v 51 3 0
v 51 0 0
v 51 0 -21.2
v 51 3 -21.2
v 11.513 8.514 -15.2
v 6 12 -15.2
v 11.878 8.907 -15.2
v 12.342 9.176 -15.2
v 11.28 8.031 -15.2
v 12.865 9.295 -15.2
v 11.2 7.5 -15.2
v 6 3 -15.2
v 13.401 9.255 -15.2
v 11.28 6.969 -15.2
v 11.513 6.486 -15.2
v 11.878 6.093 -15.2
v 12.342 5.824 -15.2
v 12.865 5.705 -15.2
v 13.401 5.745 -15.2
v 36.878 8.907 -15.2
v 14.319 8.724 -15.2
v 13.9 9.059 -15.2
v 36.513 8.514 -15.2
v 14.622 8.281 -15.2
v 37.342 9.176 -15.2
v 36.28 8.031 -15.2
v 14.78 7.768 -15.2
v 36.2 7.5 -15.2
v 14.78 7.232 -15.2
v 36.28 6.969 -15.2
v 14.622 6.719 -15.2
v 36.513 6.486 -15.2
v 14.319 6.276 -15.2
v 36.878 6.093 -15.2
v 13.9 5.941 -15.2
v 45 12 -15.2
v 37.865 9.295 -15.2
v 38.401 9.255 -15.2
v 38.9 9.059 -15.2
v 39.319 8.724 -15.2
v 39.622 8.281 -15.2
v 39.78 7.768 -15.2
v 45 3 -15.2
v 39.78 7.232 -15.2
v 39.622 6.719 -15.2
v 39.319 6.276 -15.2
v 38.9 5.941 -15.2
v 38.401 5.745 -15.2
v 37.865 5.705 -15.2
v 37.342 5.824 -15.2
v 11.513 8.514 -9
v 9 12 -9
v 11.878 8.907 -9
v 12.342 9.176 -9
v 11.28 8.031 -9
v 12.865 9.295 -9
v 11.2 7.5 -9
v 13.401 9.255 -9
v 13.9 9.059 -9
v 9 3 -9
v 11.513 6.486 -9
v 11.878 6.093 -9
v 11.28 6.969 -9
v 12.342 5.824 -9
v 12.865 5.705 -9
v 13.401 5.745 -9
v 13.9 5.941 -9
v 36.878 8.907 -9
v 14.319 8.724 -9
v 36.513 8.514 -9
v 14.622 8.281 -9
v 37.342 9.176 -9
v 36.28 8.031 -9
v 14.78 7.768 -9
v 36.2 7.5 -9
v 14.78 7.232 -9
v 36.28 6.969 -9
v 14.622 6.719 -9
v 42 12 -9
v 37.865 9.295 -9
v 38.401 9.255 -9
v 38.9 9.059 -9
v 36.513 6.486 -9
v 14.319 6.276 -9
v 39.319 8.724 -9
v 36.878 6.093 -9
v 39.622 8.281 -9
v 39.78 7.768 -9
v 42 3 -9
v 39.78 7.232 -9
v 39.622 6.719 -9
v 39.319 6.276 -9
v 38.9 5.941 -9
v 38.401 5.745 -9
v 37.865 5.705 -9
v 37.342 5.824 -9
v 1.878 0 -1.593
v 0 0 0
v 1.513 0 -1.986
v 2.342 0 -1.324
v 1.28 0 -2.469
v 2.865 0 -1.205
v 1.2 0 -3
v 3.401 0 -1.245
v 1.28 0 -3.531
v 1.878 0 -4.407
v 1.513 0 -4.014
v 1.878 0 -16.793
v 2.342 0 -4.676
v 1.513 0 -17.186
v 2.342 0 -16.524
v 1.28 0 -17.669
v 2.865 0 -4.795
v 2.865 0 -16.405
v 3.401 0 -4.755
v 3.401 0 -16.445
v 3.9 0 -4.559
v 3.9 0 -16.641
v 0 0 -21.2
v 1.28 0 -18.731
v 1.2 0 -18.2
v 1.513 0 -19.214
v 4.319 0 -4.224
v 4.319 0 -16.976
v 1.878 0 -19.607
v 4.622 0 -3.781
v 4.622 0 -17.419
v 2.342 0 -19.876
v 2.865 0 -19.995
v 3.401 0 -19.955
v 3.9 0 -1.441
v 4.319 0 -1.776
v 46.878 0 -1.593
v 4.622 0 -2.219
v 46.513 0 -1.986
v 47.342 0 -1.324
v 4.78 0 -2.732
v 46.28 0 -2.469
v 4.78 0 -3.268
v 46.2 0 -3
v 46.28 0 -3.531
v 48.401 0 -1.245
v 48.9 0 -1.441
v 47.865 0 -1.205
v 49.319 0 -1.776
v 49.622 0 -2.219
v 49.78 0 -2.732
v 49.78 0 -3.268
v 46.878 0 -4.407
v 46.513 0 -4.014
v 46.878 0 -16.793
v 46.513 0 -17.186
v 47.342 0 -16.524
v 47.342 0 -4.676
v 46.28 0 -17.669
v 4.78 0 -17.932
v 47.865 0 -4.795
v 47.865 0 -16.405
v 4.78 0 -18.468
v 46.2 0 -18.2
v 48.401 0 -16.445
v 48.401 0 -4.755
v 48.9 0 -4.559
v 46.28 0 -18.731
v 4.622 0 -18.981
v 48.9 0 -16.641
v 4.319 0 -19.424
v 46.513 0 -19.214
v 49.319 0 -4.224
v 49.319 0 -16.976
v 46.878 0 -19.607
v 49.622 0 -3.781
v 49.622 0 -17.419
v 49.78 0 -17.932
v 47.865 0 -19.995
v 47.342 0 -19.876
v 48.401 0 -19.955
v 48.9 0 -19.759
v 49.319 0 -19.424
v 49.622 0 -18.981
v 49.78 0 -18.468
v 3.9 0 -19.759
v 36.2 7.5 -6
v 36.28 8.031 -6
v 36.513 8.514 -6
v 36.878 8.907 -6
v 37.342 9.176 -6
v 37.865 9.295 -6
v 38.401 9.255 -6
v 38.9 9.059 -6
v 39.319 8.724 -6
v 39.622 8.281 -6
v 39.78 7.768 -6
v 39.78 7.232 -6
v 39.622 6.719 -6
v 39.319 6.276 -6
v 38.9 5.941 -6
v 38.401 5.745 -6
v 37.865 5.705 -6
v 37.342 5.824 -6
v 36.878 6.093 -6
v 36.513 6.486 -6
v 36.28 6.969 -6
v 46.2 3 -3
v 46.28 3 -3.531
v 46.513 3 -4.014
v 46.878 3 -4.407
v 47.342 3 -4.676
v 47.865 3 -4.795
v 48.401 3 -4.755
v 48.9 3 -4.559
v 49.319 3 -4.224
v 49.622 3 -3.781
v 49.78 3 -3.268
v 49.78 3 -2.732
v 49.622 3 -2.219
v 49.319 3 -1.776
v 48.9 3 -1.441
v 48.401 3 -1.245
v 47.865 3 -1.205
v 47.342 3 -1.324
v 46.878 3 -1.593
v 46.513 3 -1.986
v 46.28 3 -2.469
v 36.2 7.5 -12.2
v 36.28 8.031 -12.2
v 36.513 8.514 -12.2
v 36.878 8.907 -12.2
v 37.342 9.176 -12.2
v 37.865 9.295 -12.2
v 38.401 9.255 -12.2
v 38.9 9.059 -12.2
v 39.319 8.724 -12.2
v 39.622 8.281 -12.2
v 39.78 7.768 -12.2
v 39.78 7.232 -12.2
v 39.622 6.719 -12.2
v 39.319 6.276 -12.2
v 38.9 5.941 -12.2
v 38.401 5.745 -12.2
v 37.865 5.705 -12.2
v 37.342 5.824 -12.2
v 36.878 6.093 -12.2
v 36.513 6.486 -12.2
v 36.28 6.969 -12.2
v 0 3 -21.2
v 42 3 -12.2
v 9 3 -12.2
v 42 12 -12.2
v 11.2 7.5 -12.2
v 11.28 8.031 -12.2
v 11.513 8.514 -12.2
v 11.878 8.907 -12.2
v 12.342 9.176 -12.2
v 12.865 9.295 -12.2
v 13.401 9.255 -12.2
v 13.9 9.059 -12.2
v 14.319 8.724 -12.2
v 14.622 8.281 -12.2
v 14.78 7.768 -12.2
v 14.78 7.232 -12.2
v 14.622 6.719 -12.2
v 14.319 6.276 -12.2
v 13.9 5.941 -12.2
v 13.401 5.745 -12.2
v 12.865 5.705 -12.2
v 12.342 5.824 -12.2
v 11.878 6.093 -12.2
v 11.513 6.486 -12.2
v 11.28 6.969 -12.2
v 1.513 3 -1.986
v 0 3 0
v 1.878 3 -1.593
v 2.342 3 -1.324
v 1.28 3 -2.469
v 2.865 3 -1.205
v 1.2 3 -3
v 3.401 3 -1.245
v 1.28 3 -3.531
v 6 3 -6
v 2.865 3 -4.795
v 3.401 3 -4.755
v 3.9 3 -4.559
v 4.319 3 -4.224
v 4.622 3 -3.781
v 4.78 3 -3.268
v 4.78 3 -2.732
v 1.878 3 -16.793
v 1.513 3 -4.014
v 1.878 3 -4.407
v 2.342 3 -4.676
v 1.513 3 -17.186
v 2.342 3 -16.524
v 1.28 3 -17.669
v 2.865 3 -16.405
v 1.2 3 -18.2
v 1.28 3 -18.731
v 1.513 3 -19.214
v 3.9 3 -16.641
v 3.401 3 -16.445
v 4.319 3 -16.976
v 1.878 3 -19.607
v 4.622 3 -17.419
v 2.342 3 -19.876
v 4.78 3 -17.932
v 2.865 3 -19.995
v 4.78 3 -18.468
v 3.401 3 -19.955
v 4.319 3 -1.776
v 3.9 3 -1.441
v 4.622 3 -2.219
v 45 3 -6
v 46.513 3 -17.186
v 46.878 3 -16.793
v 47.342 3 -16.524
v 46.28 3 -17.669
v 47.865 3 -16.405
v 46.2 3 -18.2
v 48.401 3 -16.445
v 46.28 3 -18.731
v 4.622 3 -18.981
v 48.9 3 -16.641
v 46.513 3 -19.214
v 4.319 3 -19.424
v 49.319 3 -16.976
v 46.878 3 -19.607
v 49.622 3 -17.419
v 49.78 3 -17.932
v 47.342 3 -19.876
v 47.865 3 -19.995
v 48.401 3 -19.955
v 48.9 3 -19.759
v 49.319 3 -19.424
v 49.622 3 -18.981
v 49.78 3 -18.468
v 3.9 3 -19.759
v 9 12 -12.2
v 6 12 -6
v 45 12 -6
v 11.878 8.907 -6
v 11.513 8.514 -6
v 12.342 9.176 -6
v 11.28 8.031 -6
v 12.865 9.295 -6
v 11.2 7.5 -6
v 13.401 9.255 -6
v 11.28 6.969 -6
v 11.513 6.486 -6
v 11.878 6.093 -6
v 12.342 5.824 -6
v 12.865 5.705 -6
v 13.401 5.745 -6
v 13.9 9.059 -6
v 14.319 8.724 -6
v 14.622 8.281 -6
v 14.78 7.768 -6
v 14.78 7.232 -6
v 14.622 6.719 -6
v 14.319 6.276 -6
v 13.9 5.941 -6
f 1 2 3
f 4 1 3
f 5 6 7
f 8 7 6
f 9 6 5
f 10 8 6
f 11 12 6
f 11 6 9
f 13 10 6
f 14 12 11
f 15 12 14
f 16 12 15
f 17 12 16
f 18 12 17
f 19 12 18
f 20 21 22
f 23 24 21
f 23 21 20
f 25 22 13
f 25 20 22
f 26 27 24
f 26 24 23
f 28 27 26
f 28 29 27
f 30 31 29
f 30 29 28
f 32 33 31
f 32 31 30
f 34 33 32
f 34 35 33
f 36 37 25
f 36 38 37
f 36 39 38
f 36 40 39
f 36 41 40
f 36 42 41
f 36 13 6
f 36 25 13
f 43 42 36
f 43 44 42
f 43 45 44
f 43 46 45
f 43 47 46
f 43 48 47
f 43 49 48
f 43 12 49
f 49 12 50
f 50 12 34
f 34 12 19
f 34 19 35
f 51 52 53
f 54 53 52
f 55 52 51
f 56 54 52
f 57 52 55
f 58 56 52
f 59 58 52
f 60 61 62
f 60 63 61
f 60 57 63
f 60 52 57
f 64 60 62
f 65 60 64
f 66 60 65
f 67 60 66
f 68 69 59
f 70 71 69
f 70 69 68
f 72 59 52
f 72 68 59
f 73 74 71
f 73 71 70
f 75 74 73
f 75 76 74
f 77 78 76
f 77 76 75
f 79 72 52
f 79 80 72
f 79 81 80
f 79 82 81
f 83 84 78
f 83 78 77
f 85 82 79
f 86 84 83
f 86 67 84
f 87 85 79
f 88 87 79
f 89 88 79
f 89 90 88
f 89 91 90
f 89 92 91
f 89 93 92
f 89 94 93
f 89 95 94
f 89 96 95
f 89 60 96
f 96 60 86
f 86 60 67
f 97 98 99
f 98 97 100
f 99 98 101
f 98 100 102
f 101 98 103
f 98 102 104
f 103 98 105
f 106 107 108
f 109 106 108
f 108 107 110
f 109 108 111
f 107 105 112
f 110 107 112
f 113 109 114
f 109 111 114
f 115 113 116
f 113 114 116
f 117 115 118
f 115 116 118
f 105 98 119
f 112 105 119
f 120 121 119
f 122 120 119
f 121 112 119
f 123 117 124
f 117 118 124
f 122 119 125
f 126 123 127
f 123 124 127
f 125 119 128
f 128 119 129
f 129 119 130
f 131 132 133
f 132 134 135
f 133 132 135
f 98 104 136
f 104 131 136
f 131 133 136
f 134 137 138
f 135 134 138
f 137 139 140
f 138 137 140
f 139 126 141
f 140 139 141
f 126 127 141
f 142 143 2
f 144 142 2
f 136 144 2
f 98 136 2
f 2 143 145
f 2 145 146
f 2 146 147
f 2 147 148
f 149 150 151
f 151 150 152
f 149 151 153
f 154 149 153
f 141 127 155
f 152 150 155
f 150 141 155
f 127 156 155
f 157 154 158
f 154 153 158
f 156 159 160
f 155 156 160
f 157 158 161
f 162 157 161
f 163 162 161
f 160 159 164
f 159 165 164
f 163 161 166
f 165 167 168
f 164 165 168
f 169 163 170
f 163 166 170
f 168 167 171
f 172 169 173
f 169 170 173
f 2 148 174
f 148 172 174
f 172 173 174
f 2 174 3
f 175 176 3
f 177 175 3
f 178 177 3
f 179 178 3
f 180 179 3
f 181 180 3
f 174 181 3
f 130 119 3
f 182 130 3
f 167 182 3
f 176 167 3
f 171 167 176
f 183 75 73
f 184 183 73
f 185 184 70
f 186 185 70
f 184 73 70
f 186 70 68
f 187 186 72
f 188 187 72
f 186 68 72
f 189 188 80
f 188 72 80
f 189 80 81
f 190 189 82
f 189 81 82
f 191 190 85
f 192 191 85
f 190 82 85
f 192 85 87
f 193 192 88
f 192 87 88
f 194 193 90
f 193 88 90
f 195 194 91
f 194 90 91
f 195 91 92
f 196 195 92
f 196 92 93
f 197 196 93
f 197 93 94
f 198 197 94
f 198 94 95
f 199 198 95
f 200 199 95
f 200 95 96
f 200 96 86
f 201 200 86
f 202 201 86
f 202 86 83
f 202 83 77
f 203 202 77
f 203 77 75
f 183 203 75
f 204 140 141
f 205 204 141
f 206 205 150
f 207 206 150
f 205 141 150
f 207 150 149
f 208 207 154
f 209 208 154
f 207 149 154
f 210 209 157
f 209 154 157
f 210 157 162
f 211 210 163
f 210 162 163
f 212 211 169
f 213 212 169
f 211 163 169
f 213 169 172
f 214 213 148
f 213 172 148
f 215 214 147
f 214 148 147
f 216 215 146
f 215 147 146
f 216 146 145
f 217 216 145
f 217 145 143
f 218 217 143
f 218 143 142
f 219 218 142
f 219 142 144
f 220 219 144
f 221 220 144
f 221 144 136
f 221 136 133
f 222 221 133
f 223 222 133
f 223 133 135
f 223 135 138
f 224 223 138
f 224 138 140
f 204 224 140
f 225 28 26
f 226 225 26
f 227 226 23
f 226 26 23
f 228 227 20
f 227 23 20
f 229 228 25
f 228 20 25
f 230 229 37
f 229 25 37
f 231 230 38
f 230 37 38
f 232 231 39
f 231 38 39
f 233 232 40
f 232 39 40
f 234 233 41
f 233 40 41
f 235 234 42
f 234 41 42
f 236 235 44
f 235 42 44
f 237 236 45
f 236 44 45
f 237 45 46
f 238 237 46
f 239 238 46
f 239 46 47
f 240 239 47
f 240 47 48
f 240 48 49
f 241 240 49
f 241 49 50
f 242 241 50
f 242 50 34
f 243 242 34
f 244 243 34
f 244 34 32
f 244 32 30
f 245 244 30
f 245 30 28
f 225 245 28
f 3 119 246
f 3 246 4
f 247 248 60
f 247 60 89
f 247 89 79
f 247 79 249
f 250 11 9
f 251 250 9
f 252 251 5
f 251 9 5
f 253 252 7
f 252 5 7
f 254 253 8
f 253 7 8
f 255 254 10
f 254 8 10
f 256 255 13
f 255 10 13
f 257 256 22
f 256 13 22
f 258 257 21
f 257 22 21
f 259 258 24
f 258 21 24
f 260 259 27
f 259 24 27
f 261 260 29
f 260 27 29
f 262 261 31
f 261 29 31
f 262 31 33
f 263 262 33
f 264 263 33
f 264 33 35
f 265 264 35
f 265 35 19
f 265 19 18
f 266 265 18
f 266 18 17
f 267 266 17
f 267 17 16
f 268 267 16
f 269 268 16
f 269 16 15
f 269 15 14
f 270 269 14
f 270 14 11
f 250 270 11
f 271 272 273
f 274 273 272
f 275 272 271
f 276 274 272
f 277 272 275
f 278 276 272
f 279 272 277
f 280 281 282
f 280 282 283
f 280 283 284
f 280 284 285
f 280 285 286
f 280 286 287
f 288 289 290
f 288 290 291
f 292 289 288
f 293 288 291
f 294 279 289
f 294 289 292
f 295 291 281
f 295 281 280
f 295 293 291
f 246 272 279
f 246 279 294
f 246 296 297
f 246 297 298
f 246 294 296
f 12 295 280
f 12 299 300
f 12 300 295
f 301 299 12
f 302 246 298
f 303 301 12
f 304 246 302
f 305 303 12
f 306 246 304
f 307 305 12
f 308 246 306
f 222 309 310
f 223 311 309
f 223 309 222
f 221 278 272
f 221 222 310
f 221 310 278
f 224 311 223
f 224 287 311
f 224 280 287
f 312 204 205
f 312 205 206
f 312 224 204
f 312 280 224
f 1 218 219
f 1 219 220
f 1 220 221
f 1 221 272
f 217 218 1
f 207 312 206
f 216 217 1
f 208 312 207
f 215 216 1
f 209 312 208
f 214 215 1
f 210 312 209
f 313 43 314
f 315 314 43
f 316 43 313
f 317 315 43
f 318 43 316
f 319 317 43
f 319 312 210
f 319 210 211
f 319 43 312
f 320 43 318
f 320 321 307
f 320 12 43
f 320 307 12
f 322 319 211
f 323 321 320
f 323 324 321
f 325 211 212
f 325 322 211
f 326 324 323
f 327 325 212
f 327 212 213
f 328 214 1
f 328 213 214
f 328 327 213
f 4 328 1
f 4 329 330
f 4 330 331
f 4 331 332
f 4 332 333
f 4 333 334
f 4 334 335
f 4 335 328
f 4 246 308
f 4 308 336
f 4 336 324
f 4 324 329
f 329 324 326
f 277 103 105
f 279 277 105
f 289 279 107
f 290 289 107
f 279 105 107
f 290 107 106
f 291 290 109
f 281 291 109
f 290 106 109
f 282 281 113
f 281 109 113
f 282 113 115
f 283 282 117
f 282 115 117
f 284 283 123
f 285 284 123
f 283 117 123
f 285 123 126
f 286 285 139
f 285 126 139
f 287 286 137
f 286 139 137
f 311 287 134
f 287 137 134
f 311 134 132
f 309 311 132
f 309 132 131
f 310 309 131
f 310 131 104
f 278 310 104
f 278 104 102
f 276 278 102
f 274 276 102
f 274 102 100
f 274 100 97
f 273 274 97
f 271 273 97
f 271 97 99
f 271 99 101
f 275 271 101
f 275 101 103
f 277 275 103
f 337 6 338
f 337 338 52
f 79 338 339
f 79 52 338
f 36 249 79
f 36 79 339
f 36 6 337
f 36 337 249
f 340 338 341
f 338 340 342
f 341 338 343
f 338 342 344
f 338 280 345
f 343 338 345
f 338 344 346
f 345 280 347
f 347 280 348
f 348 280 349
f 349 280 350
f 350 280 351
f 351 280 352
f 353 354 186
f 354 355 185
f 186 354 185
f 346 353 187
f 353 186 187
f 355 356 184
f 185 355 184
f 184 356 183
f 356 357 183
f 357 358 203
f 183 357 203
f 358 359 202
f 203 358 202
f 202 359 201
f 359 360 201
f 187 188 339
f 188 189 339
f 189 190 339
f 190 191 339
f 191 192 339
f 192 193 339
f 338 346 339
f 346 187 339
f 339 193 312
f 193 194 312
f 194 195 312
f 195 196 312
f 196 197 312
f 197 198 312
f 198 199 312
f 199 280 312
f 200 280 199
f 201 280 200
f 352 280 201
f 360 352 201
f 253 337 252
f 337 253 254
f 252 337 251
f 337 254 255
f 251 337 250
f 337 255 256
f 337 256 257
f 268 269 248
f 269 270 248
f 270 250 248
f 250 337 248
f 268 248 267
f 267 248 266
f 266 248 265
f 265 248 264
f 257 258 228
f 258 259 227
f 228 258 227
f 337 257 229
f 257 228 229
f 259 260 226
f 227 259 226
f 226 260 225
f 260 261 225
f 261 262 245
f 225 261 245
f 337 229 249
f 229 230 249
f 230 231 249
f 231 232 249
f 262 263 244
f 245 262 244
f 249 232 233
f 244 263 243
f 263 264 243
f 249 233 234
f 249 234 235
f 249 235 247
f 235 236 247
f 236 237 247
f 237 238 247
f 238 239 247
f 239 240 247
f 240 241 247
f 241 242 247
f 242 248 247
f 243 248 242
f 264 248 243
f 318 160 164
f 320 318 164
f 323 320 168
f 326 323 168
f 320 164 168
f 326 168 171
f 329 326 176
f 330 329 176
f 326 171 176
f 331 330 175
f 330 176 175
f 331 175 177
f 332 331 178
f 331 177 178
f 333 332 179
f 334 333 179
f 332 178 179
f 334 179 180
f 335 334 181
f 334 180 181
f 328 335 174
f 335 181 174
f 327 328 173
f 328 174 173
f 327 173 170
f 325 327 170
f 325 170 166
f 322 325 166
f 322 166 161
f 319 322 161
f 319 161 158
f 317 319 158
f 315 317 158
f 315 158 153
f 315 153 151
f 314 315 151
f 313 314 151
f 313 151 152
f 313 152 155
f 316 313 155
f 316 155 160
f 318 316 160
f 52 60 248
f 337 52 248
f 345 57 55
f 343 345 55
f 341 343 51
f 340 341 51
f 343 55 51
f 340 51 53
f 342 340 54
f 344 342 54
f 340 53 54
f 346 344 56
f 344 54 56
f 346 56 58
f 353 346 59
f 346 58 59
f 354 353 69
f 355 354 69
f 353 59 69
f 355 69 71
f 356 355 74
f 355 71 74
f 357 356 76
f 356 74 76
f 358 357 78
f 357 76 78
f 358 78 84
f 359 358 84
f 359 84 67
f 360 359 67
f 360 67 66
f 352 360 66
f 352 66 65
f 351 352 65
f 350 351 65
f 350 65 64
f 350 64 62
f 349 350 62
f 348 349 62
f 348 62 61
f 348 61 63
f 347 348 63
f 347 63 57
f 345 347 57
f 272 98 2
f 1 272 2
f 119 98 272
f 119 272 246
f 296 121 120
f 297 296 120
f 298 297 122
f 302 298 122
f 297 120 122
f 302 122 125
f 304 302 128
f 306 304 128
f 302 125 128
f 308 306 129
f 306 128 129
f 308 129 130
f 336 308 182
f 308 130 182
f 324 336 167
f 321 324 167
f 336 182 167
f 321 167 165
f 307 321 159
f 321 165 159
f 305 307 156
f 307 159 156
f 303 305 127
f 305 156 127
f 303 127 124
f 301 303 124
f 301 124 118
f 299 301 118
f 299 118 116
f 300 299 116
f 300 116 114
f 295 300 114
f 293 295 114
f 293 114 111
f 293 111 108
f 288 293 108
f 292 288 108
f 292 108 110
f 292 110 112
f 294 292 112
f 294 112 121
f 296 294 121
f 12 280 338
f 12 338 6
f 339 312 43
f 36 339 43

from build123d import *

# Parameters (mm, degrees)
SKETCH1_W            = 51
SKETCH1_H            = 21.2
BOSS_EXTRUDE1_DEPTH  = 3
SKETCH2_W            = 39
SKETCH2_H            = 9.2
SKETCH2_W_2          = 33
SKETCH2_H_2          = 3.2
BOSS_EXTRUDE2_DEPTH  = 9
M3_CLEARANCE_HOLE1_D = 3.6
M3_CLEARANCE_HOLE2_D = 3.6


with BuildPart() as part:
    # Sketch1 → Boss-Extrude1 (new body)
    with BuildSketch(Plane(origin=(0, 0, 0), x_dir=(1, 0, 0), z_dir=(0, 1, 0))):
        with Locations((25.5, 10.6)):
            Rectangle(SKETCH1_W, SKETCH1_H)
    extrude(amount=BOSS_EXTRUDE1_DEPTH)

    # Sketch2 → Boss-Extrude2 (add)
    with BuildSketch(Plane(origin=(0, 3, 0), x_dir=(1, 0, 0), z_dir=(0, 1, 0))):
        with Locations((25.5, 10.6)):
            Rectangle(SKETCH2_W, SKETCH2_H)
        with Locations((25.5, 10.6)):
            Rectangle(SKETCH2_W_2, SKETCH2_H_2, mode=Mode.SUBTRACT)
    extrude(amount=BOSS_EXTRUDE2_DEPTH)

    # M3 Clearance Hole1 (through all)
    with Locations(Plane(origin=(0, 3, 0), x_dir=(1, 0, 0), z_dir=(0, 1, 0))):
        with Locations((3, 18.2), (48, 18.2), (48, 3), (3, 3)):
            Hole(M3_CLEARANCE_HOLE1_D / 2)

    # M3 Clearance Hole2 (through all)
    with Locations(Plane.XY.offset(-6)):
        with Locations((13, 7.5), (38, 7.5)):
            Hole(M3_CLEARANCE_HOLE2_D / 2)


solid = part.part
